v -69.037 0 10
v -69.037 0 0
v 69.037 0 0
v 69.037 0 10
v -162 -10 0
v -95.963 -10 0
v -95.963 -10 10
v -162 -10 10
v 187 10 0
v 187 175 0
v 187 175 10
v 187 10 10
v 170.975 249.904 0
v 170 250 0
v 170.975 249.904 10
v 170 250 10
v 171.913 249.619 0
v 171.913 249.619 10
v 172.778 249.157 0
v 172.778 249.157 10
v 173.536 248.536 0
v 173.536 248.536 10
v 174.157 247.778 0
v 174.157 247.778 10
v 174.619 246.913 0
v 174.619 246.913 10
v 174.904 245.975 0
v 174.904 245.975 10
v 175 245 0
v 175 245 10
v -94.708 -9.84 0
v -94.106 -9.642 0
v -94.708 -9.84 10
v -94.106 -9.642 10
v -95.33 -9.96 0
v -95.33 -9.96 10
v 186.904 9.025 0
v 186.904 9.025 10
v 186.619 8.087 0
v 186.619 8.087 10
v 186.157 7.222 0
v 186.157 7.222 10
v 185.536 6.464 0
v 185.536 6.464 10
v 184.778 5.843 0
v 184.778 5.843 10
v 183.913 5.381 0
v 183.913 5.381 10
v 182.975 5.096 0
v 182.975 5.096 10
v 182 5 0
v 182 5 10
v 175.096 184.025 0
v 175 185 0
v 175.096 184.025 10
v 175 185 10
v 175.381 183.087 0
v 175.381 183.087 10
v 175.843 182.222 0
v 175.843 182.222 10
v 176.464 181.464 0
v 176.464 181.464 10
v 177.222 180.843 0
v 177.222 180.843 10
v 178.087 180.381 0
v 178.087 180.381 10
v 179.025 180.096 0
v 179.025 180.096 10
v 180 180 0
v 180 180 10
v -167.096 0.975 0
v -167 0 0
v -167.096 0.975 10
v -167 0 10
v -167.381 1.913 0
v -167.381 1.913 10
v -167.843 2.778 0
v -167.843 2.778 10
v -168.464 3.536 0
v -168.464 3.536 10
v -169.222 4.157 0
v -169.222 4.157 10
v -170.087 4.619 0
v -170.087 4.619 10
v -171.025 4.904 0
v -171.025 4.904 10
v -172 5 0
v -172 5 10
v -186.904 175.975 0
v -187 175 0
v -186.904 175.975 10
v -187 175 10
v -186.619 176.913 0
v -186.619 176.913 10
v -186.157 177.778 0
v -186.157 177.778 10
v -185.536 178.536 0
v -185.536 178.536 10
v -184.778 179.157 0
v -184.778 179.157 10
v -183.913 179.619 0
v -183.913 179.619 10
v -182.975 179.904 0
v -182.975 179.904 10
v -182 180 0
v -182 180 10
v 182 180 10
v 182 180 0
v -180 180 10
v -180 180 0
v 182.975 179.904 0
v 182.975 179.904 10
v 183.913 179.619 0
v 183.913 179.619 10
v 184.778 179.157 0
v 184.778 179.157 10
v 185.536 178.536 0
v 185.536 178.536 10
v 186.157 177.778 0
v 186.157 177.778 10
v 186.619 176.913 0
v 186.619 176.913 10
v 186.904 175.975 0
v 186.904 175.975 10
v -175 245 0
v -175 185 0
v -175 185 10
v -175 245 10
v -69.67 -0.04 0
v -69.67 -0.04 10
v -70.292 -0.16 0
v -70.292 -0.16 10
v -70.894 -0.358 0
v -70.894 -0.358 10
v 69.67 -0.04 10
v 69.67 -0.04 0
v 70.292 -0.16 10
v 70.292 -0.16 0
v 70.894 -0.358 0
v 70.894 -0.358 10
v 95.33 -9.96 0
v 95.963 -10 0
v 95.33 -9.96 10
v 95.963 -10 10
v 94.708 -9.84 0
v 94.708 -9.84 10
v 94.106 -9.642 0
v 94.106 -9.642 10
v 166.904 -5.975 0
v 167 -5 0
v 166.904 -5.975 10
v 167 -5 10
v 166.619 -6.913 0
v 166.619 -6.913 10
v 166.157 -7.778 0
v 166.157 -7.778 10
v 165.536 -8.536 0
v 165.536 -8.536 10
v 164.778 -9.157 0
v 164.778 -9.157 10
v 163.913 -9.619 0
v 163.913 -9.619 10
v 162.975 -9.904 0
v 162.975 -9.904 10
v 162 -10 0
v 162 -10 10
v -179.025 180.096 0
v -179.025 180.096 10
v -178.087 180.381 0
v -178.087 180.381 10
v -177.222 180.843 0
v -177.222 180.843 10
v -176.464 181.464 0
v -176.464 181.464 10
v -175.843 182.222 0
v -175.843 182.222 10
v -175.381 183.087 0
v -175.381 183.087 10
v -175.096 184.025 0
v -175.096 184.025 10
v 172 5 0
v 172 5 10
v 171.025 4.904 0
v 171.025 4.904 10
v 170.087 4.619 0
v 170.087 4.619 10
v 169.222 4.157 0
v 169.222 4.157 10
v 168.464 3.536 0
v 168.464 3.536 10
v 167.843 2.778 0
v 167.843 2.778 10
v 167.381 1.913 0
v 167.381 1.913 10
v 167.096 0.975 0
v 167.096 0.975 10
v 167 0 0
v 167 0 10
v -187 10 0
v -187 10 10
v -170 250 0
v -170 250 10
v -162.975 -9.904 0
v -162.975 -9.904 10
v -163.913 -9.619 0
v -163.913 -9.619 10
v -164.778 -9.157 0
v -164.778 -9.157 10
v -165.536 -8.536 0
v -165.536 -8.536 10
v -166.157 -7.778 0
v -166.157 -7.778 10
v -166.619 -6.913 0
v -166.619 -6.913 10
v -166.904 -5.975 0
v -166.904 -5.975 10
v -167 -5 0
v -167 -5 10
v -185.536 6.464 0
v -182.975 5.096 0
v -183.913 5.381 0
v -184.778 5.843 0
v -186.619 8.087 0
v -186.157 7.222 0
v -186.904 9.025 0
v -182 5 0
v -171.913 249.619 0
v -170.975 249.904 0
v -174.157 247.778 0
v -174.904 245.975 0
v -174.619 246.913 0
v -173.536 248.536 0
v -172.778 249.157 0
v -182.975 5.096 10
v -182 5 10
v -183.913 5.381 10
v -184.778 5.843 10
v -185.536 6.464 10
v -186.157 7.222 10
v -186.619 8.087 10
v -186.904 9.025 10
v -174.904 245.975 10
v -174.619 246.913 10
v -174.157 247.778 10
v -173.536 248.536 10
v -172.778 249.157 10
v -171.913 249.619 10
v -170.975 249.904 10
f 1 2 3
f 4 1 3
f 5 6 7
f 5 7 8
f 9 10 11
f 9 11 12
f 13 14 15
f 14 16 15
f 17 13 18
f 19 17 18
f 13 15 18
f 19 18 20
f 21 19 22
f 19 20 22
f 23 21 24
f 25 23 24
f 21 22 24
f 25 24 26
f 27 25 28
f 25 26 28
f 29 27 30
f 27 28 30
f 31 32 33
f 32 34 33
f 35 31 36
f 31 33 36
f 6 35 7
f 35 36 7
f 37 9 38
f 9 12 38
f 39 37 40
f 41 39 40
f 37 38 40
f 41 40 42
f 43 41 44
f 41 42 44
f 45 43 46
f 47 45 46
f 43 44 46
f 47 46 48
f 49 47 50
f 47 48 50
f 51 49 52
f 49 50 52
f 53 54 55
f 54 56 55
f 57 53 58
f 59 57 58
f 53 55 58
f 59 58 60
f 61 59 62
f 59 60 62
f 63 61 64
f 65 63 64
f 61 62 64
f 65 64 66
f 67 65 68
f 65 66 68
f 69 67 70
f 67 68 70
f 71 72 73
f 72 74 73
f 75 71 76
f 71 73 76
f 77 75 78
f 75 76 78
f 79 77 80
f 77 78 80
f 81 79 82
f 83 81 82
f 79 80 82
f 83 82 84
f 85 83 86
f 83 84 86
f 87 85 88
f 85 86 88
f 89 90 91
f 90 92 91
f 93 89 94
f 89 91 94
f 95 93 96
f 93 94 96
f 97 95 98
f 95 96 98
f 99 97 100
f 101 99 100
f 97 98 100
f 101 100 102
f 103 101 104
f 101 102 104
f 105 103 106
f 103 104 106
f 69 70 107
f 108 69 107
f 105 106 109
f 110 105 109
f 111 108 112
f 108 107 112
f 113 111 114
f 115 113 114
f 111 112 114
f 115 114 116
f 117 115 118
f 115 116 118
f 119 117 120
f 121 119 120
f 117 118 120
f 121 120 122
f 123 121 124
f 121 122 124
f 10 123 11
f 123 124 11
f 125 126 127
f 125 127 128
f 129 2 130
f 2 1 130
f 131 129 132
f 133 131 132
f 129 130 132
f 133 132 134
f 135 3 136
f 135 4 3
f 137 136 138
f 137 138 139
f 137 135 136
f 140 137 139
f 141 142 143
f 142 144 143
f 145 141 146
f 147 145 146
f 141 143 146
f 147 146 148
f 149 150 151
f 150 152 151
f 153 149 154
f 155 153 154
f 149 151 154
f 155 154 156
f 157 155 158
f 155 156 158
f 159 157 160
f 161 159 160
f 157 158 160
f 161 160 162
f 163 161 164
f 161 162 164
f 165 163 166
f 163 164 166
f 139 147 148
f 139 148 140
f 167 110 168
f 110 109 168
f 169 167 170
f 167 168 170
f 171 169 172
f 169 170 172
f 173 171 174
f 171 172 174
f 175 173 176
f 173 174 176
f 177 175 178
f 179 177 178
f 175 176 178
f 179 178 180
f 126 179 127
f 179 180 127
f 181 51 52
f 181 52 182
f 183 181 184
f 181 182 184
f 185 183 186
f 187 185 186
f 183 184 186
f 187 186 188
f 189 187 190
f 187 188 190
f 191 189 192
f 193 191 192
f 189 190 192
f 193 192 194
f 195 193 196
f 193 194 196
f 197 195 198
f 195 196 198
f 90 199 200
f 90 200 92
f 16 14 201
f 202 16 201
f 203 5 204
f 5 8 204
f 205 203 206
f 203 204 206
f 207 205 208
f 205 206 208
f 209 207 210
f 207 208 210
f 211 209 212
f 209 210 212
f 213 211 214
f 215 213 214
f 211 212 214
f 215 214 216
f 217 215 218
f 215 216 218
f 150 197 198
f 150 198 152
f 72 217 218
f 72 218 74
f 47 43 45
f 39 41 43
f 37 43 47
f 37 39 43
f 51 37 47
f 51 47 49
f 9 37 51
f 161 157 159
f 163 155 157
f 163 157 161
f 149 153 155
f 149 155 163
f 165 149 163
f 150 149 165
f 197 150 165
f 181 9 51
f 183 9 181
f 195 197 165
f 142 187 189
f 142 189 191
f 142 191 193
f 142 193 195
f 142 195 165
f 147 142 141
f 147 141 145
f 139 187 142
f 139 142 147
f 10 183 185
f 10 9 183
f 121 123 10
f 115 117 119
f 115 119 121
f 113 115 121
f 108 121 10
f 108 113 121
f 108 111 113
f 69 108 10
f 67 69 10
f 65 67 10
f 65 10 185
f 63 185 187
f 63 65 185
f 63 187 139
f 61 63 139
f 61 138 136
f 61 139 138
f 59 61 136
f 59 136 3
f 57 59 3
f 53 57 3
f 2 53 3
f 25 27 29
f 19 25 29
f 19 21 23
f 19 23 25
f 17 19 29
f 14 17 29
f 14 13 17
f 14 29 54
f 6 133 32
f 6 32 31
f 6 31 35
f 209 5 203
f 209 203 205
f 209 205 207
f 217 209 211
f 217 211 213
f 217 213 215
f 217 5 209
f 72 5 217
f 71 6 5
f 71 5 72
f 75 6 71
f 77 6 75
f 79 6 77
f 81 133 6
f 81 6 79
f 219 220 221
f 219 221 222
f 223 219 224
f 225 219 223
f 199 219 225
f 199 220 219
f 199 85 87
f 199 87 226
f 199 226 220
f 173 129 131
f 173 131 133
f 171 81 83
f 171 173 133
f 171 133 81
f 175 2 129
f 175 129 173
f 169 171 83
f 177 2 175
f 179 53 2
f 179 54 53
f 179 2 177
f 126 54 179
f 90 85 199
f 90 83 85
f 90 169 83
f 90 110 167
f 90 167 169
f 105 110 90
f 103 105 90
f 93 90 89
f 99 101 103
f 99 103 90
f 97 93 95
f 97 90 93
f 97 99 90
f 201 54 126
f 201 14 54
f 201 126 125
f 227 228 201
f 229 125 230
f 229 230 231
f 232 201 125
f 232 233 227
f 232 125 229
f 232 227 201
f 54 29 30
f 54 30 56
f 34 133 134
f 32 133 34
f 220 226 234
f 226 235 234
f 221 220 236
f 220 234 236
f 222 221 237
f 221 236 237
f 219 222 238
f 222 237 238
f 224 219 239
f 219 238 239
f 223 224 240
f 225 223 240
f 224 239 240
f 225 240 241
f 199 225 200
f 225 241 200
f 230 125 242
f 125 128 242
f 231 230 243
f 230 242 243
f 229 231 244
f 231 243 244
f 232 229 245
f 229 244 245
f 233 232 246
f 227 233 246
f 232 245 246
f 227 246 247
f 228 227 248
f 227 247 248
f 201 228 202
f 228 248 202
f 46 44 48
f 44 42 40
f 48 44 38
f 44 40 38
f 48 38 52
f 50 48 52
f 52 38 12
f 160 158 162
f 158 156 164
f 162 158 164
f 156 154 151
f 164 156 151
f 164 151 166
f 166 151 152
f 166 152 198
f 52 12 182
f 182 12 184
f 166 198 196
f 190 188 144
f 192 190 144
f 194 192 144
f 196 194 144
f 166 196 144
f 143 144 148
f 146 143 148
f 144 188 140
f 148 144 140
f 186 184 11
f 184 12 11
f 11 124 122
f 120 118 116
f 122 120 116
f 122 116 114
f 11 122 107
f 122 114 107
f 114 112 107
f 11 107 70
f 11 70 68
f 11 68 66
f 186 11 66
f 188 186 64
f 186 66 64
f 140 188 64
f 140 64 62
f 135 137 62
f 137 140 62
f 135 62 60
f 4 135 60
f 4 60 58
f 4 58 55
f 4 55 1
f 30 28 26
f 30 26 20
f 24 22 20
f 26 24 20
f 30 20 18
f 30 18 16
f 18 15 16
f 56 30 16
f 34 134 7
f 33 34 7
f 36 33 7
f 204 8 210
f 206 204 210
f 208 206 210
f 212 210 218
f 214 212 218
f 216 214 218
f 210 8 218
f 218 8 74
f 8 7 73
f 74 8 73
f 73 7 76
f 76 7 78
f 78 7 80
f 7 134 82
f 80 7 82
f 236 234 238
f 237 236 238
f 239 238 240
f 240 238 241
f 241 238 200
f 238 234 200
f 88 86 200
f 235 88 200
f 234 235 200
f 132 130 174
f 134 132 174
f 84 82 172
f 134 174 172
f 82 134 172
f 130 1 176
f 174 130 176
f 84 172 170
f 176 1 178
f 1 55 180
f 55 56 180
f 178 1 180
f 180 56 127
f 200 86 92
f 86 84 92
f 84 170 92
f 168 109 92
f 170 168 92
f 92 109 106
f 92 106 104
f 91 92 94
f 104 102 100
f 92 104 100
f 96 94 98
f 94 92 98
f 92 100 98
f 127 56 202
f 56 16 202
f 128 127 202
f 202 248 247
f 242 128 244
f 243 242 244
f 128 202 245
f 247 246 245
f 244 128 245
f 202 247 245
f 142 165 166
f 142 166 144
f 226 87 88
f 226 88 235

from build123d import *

# Parameters (mm, degrees)
PAD_DEPTH = 10
FILLET_R  = 5


with BuildPart() as part:
    # Sketch → Pad (new body)
    with BuildSketch(Plane.XY):
        Polygon((0, 0), (-70, 0), (-95, -10), (-167, -10), (-167, 5), (-187, 5), (-187, 180), (-175, 180), (-175, 250), (0, 250), (175, 250), (175, 180), (187, 180), (187, 5), (167, 5), (167, -10), (95, -10), (70, 0), align=None)
    extrude(amount=PAD_DEPTH)

    # Fillet
    fillet_edges = [part.edges().sort_by_distance(p)[0] for p in [
        (-70, 0, 5),
        (70, 0, 5),
        (95, -10, 5),
        (167, -10, 5),
        (167, 5, 5),
        (187, 5, 5),
        (187, 180, 5),
        (175, 250, 5),
        (175, 180, 5),
        (-175, 250, 5),
        (-175, 180, 5),
        (-187, 180, 5),
        (-187, 5, 5),
        (-167, 5, 5),
        (-167, -10, 5),
        (-95, -10, 5),
    ]]
    fillet(fillet_edges, radius=FILLET_R)


solid = part.part
